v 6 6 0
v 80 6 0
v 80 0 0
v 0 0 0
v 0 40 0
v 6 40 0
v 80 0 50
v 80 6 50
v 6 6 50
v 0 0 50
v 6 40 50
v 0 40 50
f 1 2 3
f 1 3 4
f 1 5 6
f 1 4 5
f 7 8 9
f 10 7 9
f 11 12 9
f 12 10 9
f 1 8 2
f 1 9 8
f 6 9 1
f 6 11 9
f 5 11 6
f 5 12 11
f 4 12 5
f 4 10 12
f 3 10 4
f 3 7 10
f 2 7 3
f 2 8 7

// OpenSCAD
$fn = 32;

// ----------------------------------------------------------------------
// Structural section: angle 80 x 40 mm
// ----------------------------------------------------------------------

// --- parameters (mm) ---
sec_w = 80;               // leg width, X
sec_h = 40;               // leg height, Y
flange_t = 6;             // leg thickness
plate_t = 50;             // cut length, Z (extrusion height)
fit_tol = 0.1;            // declared fit tolerance (prompt contract)
free_tol = 0.5;           // declared free tolerance (prompt contract)

profile = [[0, 0], [80, 0], [80, 6], [6, 6], [6, 40], [0, 40]];  // primary outline, 6 points, counter clockwise

// --- the one profile operation ---
linear_extrude(height = plate_t) polygon(points = profile);
